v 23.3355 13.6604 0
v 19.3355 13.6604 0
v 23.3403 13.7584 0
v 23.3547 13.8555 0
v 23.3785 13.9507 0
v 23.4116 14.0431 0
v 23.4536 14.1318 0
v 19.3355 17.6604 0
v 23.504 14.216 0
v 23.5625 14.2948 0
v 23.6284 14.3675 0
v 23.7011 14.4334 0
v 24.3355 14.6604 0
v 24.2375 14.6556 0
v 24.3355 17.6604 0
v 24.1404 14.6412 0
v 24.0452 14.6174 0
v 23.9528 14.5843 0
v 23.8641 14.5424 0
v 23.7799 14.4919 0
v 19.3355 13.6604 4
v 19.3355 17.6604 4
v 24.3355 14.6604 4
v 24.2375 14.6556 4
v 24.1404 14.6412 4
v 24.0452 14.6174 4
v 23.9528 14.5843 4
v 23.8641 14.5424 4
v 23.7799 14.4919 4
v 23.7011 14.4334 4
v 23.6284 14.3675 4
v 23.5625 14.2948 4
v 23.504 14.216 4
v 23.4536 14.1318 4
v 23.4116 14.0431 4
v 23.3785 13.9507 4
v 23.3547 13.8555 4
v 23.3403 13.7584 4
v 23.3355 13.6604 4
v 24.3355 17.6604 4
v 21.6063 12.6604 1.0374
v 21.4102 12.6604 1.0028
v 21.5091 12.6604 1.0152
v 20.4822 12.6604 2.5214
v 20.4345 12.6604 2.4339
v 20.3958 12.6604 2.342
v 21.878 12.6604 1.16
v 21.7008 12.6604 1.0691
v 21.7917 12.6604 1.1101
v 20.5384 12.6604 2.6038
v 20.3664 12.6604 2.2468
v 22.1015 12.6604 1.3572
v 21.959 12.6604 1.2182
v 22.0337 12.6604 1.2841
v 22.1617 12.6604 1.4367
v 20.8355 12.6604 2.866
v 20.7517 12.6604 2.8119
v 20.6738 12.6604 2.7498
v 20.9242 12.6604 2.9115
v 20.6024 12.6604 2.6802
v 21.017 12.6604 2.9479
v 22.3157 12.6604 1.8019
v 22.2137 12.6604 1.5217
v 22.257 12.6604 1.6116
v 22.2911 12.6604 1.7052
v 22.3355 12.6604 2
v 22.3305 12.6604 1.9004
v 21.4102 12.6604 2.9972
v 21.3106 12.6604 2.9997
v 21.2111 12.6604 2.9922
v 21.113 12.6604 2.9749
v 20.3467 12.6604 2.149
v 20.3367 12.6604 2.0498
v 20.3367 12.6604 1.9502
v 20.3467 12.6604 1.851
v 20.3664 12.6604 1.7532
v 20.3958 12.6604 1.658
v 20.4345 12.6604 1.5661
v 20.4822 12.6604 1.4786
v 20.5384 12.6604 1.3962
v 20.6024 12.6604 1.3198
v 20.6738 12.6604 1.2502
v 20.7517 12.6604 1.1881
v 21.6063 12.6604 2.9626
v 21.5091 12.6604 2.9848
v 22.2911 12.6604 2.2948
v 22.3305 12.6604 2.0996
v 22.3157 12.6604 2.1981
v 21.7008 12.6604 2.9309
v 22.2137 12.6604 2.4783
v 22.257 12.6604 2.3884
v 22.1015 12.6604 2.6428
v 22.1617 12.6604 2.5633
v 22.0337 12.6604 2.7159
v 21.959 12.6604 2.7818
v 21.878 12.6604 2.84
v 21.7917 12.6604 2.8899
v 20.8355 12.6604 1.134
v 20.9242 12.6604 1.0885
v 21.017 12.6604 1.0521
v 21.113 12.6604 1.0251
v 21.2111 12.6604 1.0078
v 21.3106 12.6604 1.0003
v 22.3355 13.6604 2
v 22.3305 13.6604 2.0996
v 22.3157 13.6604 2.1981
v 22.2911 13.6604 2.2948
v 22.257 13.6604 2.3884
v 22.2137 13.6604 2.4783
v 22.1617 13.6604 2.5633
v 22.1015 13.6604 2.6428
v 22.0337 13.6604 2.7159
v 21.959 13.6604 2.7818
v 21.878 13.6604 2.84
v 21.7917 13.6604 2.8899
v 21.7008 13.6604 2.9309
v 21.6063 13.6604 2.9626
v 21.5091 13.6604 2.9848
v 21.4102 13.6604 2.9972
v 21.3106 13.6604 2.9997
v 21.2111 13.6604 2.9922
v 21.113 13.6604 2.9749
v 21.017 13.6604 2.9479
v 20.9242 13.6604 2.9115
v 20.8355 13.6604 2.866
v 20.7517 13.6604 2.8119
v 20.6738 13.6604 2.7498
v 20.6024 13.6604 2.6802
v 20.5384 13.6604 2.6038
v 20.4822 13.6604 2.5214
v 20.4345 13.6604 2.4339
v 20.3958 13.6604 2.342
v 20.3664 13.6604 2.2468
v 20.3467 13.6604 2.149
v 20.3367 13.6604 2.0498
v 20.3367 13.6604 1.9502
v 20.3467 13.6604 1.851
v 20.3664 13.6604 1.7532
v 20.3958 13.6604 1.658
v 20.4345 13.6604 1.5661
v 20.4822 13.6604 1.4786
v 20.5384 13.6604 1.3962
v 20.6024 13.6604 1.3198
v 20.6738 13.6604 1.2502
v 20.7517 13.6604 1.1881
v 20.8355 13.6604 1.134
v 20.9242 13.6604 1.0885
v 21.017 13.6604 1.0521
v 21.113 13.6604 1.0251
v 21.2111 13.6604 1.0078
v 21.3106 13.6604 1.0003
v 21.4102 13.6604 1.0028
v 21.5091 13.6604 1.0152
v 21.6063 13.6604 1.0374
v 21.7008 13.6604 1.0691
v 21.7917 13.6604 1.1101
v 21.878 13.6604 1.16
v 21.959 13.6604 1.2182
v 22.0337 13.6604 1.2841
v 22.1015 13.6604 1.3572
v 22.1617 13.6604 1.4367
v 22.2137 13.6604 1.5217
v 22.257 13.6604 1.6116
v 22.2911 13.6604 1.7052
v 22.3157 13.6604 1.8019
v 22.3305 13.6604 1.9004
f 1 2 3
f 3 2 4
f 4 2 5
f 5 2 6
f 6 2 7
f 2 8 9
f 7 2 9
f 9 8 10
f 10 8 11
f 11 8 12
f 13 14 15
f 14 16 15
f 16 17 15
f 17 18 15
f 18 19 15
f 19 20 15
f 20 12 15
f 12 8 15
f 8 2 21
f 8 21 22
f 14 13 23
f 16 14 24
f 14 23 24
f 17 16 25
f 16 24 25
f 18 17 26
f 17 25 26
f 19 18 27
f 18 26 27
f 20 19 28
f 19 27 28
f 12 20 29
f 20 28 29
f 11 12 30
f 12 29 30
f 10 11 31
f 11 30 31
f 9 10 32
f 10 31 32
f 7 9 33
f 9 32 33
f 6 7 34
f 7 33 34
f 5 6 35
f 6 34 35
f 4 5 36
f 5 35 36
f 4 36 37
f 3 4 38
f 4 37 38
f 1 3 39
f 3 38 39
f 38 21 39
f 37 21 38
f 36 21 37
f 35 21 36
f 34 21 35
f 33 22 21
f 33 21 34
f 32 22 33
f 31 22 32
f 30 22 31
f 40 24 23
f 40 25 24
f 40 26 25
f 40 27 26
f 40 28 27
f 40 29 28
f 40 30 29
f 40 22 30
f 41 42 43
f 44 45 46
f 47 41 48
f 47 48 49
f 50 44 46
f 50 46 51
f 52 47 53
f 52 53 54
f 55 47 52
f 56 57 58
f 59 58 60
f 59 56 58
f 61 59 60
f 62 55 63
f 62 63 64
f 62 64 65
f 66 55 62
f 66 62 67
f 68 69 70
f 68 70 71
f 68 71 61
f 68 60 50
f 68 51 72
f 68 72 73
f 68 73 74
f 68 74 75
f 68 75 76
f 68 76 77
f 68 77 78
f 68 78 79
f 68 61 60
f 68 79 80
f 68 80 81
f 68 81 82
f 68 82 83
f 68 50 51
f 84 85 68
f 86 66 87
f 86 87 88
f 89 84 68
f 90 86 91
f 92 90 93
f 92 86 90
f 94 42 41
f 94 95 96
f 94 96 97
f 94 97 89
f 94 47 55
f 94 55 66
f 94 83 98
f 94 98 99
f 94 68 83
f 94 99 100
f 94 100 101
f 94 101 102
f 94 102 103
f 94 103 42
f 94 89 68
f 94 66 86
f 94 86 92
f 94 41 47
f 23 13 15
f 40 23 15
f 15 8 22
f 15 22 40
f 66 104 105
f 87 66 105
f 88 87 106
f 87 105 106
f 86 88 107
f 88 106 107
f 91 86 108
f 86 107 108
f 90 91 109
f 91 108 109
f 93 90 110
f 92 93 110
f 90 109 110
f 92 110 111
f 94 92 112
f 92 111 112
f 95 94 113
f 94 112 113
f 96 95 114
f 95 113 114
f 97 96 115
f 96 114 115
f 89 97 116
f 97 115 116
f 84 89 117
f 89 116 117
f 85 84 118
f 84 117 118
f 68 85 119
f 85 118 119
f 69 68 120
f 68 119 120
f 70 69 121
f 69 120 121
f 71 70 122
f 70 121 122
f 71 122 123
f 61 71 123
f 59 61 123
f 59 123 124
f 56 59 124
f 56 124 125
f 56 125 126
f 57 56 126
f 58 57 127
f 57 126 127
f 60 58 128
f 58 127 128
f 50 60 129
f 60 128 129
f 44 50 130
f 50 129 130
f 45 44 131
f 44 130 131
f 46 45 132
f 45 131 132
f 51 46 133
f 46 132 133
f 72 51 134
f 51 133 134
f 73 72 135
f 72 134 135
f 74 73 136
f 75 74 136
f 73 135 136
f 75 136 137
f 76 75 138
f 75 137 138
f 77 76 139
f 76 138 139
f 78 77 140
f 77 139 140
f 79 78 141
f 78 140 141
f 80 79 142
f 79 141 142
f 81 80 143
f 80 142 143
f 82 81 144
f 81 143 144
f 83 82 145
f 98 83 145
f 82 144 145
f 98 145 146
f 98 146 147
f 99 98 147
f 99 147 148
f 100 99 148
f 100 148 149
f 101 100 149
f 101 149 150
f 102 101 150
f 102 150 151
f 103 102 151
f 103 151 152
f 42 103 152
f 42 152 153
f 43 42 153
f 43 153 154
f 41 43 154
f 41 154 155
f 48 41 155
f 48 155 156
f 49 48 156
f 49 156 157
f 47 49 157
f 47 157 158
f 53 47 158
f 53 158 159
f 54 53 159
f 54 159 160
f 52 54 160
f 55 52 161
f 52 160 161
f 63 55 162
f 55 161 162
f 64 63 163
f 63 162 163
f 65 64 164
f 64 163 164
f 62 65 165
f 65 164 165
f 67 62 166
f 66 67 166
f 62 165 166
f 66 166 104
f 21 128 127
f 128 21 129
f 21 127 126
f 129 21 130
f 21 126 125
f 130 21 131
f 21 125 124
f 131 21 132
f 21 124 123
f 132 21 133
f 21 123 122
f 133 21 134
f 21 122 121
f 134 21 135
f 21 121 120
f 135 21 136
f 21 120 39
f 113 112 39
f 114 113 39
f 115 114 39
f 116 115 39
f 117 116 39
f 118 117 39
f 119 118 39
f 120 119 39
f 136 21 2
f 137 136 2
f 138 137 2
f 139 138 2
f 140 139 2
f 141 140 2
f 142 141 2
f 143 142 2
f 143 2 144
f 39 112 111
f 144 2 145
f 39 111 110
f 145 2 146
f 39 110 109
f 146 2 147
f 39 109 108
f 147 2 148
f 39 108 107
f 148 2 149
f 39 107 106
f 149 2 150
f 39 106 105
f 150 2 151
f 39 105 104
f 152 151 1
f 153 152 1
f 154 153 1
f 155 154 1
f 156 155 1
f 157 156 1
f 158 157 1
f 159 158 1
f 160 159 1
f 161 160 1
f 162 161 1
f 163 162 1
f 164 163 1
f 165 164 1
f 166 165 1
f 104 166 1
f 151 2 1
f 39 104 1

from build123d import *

# Parameters (mm, degrees)
F0_W     = 5
F0_H     = 4
F1_DEPTH = 4
F2_R     = 1
F3_DEPTH = 4.1
F4_R     = 1
F5_DEPTH = 1


with BuildPart() as f1:
    # F0 (on Top) → F1 (new body)
    with BuildSketch(Plane.XY):
        with Locations((21.835487, 15.660429)):
            Rectangle(F0_W, F0_H)
    extrude(amount=F1_DEPTH)

    # F2 (on face) → F3 (cut)
    with BuildSketch(Plane.XY.offset(4)):
        with Locations((24.335487, 13.660429)):
            Circle(F2_R)
    extrude(amount=-F3_DEPTH, mode=Mode.SUBTRACT)

    # F4 (on face) → F5 (join)
    with BuildSketch(Plane.XZ.offset(-13.660429)):
        with Locations((21.335487, 2)):
            Circle(F4_R)
    extrude(amount=F5_DEPTH)


solid = f1.part
